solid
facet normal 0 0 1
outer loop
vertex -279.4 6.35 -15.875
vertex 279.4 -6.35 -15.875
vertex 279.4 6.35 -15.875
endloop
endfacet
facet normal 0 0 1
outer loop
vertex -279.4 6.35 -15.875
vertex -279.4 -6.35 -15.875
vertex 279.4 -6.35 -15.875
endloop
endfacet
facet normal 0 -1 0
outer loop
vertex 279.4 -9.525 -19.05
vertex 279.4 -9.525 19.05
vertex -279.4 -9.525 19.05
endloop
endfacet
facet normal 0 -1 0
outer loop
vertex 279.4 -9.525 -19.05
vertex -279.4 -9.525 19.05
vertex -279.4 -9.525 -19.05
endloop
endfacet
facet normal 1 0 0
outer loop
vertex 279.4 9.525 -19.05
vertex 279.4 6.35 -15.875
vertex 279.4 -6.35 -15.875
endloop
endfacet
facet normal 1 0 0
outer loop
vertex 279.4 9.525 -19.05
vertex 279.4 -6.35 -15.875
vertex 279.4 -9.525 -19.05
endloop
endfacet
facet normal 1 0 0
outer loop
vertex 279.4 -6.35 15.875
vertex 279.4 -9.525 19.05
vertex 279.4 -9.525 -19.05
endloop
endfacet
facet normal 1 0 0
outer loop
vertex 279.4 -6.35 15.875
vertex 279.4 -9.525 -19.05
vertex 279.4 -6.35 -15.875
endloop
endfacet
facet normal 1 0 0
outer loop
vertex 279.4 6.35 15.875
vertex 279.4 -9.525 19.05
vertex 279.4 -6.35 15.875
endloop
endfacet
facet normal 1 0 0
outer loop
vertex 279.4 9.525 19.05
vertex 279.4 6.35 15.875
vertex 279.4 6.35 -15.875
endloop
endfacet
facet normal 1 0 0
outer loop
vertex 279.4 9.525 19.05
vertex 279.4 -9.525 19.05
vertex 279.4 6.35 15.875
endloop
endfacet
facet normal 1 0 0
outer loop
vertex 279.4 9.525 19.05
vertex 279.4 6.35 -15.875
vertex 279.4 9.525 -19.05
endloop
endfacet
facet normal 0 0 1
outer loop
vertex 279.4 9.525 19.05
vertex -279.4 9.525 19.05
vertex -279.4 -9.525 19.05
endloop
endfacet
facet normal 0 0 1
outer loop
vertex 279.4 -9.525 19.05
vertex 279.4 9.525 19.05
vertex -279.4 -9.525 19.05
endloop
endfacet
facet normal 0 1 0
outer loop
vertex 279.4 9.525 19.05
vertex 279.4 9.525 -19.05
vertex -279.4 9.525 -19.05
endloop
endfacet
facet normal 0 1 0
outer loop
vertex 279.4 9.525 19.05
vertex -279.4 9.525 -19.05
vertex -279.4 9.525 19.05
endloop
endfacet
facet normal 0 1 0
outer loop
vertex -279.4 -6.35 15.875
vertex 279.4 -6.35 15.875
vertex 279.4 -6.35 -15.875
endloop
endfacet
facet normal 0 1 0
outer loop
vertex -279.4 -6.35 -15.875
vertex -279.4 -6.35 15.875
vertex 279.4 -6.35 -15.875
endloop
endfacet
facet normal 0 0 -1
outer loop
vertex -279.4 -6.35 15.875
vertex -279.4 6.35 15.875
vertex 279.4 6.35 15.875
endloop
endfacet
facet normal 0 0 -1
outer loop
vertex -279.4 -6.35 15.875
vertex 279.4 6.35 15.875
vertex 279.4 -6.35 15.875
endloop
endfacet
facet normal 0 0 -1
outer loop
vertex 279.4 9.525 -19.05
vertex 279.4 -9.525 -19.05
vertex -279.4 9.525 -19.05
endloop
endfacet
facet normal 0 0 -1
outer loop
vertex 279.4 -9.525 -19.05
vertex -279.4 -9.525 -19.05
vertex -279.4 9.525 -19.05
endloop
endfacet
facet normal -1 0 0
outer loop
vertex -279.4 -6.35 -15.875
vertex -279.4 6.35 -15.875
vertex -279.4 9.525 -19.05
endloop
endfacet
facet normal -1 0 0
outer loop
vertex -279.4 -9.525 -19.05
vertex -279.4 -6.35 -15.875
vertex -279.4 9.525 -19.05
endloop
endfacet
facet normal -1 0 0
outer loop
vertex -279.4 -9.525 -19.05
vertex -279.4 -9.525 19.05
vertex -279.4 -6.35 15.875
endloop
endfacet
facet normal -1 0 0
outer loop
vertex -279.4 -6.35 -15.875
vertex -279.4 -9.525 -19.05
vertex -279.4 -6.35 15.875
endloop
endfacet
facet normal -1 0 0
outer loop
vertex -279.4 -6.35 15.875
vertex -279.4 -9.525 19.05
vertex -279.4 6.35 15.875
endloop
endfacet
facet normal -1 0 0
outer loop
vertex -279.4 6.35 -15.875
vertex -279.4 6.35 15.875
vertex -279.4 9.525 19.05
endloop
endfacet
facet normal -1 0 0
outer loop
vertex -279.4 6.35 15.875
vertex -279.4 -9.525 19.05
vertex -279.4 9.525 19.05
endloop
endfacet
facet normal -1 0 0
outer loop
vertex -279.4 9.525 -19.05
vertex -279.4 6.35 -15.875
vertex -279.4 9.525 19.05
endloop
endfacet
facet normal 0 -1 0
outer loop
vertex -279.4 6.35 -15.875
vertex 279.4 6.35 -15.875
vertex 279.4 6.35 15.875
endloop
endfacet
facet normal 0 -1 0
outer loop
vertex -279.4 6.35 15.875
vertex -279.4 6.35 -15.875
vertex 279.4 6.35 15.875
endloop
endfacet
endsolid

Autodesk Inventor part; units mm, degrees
ref_plane "YZ Plane" through (0, 0, 0) normal (1, 0, 0) x (0, 1, 0)
ref_plane "XZ Plane" through (0, 0, 0) normal (0, 1, 0) x (-1, 0, 0)
ref_plane "XY Plane" through (0, 0, 0) normal (0, 0, 1) x (1, 0, 0)
sketch "Sketch1" plane through (0, 0, 0) normal (1, 0, 0) x (0, 1, 0)
  line L0 (-9.525, 19.05) -> (-9.525, -19.05)
  line L1 (-9.525, -19.05) -> (9.525, -19.05)
  line L2 (9.525, -19.05) -> (9.525, 19.05)
  line L3 (9.525, 19.05) -> (-9.525, 19.05)
  line L4 (-9.525, 19.05) -> (9.525, -19.05) construction
  line L5 (-9.525, -19.05) -> (9.525, 19.05) construction
  line L6 (-6.35, 15.875) -> (-6.35, -15.875)
  line L7 (-6.35, -15.875) -> (6.35, -15.875)
  line L8 (6.35, -15.875) -> (6.35, 15.875)
  line L9 (6.35, 15.875) -> (-6.35, 15.875)
  line L10 (-6.35, 15.875) -> (6.35, -15.875) construction
  line L11 (-6.35, -15.875) -> (6.35, 15.875) construction
  point P0 (0, 0)
  dimension "d0" = 19.05
  dimension "d1" = 38.1
  dimension "d2" = 3.175
  dimension "d3" = 3.175
extrude "Extrusion1" add sketch "Sketch1" along normal mid plane 558.8
equation "\"d0\" = width"
equation "\"d1\" = height"
equation "\"d2\" = wallThickness"
equation "\"d3\" = wallThickness"
equation "\"d4\" = length"
equation "\"width\" = 19.05"
equation "\"height\" = 38.1"
equation "\"length\" = 558.8"
equation "\"wallThickness\" = 3.175"
properties part number "3_4x1_1_2_alumTubing" material "Aluminum 6061"
